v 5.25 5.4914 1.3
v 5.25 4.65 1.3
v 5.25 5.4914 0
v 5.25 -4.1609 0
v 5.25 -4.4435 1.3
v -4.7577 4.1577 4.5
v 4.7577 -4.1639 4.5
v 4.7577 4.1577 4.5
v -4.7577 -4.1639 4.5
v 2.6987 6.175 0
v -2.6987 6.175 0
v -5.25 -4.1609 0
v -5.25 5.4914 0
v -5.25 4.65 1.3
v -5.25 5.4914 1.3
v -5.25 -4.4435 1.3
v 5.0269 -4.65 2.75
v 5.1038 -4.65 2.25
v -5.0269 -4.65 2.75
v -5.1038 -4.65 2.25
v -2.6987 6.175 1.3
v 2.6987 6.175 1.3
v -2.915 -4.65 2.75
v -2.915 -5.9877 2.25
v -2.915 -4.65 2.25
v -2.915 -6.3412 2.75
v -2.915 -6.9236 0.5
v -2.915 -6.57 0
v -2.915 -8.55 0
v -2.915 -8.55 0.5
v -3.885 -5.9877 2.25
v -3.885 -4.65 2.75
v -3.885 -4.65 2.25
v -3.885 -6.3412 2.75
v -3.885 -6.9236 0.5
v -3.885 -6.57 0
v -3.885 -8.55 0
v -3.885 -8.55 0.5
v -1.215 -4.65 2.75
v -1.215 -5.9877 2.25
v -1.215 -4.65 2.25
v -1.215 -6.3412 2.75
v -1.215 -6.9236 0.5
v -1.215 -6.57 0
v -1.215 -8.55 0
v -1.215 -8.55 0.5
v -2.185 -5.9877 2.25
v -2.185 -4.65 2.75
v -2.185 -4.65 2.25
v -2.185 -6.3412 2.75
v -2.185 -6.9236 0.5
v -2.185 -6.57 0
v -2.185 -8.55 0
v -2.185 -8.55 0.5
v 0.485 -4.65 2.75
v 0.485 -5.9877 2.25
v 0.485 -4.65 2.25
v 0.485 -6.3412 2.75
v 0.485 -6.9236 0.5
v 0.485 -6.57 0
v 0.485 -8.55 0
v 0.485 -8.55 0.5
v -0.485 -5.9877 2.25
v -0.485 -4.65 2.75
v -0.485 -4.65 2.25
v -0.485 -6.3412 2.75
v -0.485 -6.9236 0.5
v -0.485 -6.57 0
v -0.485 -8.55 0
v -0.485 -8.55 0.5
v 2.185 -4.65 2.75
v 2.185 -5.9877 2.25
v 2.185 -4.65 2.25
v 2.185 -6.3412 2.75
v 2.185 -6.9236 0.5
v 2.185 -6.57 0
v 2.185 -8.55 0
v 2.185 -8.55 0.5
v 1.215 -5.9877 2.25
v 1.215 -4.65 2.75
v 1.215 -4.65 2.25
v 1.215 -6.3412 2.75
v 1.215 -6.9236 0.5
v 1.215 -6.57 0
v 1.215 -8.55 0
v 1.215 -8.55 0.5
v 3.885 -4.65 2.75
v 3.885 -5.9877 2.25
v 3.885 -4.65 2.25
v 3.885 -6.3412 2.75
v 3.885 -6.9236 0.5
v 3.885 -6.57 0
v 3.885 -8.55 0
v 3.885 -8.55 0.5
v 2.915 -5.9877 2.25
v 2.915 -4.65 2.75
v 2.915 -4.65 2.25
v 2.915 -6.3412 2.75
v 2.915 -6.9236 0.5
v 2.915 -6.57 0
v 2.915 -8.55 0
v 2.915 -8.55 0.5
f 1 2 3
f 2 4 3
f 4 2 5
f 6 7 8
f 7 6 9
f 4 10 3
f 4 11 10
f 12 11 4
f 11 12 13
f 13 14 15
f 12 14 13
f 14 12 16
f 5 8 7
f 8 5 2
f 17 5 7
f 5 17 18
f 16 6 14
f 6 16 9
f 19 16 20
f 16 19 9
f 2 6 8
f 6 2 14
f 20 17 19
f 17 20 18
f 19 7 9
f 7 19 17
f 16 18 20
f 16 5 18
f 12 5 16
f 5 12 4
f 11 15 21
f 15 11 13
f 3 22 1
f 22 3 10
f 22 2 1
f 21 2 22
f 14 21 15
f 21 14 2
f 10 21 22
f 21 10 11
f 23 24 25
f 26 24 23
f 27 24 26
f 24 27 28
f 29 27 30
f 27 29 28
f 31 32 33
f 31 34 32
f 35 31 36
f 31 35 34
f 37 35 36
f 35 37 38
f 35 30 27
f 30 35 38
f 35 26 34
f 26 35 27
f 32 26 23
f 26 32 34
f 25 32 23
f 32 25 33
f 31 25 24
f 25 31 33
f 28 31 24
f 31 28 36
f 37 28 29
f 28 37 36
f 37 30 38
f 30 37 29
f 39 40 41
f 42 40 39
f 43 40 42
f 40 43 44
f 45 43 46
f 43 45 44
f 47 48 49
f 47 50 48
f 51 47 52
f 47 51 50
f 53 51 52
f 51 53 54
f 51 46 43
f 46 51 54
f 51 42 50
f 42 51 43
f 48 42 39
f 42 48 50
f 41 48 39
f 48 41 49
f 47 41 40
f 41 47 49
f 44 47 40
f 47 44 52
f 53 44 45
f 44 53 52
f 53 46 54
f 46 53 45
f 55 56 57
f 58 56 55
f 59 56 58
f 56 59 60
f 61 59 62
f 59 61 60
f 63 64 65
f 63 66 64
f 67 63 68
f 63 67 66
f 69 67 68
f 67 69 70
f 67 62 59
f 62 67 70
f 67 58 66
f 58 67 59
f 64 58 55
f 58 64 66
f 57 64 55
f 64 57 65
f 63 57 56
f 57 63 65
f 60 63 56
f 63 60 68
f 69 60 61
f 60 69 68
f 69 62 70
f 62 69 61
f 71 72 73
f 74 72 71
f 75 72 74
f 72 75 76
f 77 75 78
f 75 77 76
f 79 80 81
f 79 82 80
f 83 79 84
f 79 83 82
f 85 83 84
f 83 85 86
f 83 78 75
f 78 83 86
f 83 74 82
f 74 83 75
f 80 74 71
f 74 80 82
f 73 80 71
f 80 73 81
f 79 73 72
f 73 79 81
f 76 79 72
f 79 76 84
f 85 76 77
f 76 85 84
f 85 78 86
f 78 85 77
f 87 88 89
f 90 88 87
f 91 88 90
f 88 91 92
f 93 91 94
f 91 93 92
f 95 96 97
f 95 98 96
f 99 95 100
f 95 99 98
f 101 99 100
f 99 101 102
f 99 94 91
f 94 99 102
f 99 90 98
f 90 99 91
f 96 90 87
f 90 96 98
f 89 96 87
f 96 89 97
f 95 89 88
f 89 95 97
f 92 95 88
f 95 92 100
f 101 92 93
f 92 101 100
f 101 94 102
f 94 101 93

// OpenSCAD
body_width = 10.5;
body_width_chamfer = 0.5;

body_length = 9.3;
body_length_chamfer = 0.5;

body_height = 4.5;

tab_length = 1.525;
tab_chamfer_angle = 15;
tab_chamfer_offset = 0.75;
tab_height = 1.3;

pin_pitch = 1.7;
pin_length = 3.9;
pin_width = 0.97;
pin_seating = 1.98;
pin_gull_angle = 15;
leadframe_height = 2.5;
leadframe_thickness = 0.5;

overall_width = body_width + 2*pin_length;


color("#111") difference() {
    translate([0, 0, body_height/2]) cube([body_width, body_length, body_height], center = true);
    
    rotate([90, 0, 0]) linear_extrude(center = true, convexity = 2) {
        polygon([
            [body_width/2, tab_height],
            [body_width/2 - body_width_chamfer, body_height + 0.05],
            [body_width, body_height + 0.05],
            [body_width, tab_height],
        ]);
        polygon([
            [-body_width/2, tab_height],
            [-body_width/2 + body_width_chamfer, body_height + 0.05],
            [-body_width, body_height + 0.05],
            [-body_width, tab_height],
        ]);
    }
    
    rotate([90, 0, 90]) linear_extrude(center = true, convexity = 2) {
        polygon([
            [body_length/2, tab_height],
            [body_length/2 - body_length_chamfer, body_height + 0.05],
            [body_length, body_height + 0.05],
            [body_length, tab_height],
        ]);
        polygon([
            [-body_length/2 + body_length_chamfer, -0.05],
            [-body_length/2, leadframe_height - leadframe_thickness/2],
            [-body_length/2, leadframe_height + leadframe_thickness/2],
            [-body_length/2 + body_width_chamfer, body_height + 0.05],
            [-body_length, body_height + 0.05],
            [-body_length, -0.05],
        ]);    
    }
}

color("#aaa") {
    // tab
    difference() {
        translate([0, body_length/2 + tab_length/2, tab_height/2]) cube([body_width, tab_length, tab_height], center = true);
        translate([0, body_length/2 + tab_length*1.5 + tab_chamfer_offset, tab_height/2]) {
            rotate([0, 0, tab_chamfer_angle]) cube([body_width*1.5, tab_length, tab_height * 2], center = true);
            rotate([0, 0, -tab_chamfer_angle]) cube([body_width*1.5, tab_length, tab_height * 2], center = true);
        }
    }
    
    // pins
    translate([0, -body_length/2 - pin_length, 0]) for (p = [-2 : 2]) translate([pin_pitch * p, 0, 0]) {
        rotate([0, 0, 180]) pin();
    }
}

module pin() {
    rotate([90, 0, 90]) linear_extrude(height = pin_width, center = true) {
        gull_offset = leadframe_height - leadframe_thickness / 2;
        pin_length = (overall_width - body_width) / 2;
        sine = sin(pin_gull_angle);
        cosine = cos(pin_gull_angle);
        polygon([
            [0, 0],
            [-pin_seating, 0],
            [-pin_seating - sine * gull_offset, gull_offset],
            [-pin_length, gull_offset],
            [-pin_length, gull_offset + leadframe_thickness],
            [-pin_seating - sine * (gull_offset + leadframe_thickness) + cosine * leadframe_thickness, gull_offset + leadframe_thickness],
            [-pin_seating - sine * leadframe_thickness + cosine * leadframe_thickness, leadframe_thickness],
            [0, leadframe_thickness],
        ]);
    }
}
